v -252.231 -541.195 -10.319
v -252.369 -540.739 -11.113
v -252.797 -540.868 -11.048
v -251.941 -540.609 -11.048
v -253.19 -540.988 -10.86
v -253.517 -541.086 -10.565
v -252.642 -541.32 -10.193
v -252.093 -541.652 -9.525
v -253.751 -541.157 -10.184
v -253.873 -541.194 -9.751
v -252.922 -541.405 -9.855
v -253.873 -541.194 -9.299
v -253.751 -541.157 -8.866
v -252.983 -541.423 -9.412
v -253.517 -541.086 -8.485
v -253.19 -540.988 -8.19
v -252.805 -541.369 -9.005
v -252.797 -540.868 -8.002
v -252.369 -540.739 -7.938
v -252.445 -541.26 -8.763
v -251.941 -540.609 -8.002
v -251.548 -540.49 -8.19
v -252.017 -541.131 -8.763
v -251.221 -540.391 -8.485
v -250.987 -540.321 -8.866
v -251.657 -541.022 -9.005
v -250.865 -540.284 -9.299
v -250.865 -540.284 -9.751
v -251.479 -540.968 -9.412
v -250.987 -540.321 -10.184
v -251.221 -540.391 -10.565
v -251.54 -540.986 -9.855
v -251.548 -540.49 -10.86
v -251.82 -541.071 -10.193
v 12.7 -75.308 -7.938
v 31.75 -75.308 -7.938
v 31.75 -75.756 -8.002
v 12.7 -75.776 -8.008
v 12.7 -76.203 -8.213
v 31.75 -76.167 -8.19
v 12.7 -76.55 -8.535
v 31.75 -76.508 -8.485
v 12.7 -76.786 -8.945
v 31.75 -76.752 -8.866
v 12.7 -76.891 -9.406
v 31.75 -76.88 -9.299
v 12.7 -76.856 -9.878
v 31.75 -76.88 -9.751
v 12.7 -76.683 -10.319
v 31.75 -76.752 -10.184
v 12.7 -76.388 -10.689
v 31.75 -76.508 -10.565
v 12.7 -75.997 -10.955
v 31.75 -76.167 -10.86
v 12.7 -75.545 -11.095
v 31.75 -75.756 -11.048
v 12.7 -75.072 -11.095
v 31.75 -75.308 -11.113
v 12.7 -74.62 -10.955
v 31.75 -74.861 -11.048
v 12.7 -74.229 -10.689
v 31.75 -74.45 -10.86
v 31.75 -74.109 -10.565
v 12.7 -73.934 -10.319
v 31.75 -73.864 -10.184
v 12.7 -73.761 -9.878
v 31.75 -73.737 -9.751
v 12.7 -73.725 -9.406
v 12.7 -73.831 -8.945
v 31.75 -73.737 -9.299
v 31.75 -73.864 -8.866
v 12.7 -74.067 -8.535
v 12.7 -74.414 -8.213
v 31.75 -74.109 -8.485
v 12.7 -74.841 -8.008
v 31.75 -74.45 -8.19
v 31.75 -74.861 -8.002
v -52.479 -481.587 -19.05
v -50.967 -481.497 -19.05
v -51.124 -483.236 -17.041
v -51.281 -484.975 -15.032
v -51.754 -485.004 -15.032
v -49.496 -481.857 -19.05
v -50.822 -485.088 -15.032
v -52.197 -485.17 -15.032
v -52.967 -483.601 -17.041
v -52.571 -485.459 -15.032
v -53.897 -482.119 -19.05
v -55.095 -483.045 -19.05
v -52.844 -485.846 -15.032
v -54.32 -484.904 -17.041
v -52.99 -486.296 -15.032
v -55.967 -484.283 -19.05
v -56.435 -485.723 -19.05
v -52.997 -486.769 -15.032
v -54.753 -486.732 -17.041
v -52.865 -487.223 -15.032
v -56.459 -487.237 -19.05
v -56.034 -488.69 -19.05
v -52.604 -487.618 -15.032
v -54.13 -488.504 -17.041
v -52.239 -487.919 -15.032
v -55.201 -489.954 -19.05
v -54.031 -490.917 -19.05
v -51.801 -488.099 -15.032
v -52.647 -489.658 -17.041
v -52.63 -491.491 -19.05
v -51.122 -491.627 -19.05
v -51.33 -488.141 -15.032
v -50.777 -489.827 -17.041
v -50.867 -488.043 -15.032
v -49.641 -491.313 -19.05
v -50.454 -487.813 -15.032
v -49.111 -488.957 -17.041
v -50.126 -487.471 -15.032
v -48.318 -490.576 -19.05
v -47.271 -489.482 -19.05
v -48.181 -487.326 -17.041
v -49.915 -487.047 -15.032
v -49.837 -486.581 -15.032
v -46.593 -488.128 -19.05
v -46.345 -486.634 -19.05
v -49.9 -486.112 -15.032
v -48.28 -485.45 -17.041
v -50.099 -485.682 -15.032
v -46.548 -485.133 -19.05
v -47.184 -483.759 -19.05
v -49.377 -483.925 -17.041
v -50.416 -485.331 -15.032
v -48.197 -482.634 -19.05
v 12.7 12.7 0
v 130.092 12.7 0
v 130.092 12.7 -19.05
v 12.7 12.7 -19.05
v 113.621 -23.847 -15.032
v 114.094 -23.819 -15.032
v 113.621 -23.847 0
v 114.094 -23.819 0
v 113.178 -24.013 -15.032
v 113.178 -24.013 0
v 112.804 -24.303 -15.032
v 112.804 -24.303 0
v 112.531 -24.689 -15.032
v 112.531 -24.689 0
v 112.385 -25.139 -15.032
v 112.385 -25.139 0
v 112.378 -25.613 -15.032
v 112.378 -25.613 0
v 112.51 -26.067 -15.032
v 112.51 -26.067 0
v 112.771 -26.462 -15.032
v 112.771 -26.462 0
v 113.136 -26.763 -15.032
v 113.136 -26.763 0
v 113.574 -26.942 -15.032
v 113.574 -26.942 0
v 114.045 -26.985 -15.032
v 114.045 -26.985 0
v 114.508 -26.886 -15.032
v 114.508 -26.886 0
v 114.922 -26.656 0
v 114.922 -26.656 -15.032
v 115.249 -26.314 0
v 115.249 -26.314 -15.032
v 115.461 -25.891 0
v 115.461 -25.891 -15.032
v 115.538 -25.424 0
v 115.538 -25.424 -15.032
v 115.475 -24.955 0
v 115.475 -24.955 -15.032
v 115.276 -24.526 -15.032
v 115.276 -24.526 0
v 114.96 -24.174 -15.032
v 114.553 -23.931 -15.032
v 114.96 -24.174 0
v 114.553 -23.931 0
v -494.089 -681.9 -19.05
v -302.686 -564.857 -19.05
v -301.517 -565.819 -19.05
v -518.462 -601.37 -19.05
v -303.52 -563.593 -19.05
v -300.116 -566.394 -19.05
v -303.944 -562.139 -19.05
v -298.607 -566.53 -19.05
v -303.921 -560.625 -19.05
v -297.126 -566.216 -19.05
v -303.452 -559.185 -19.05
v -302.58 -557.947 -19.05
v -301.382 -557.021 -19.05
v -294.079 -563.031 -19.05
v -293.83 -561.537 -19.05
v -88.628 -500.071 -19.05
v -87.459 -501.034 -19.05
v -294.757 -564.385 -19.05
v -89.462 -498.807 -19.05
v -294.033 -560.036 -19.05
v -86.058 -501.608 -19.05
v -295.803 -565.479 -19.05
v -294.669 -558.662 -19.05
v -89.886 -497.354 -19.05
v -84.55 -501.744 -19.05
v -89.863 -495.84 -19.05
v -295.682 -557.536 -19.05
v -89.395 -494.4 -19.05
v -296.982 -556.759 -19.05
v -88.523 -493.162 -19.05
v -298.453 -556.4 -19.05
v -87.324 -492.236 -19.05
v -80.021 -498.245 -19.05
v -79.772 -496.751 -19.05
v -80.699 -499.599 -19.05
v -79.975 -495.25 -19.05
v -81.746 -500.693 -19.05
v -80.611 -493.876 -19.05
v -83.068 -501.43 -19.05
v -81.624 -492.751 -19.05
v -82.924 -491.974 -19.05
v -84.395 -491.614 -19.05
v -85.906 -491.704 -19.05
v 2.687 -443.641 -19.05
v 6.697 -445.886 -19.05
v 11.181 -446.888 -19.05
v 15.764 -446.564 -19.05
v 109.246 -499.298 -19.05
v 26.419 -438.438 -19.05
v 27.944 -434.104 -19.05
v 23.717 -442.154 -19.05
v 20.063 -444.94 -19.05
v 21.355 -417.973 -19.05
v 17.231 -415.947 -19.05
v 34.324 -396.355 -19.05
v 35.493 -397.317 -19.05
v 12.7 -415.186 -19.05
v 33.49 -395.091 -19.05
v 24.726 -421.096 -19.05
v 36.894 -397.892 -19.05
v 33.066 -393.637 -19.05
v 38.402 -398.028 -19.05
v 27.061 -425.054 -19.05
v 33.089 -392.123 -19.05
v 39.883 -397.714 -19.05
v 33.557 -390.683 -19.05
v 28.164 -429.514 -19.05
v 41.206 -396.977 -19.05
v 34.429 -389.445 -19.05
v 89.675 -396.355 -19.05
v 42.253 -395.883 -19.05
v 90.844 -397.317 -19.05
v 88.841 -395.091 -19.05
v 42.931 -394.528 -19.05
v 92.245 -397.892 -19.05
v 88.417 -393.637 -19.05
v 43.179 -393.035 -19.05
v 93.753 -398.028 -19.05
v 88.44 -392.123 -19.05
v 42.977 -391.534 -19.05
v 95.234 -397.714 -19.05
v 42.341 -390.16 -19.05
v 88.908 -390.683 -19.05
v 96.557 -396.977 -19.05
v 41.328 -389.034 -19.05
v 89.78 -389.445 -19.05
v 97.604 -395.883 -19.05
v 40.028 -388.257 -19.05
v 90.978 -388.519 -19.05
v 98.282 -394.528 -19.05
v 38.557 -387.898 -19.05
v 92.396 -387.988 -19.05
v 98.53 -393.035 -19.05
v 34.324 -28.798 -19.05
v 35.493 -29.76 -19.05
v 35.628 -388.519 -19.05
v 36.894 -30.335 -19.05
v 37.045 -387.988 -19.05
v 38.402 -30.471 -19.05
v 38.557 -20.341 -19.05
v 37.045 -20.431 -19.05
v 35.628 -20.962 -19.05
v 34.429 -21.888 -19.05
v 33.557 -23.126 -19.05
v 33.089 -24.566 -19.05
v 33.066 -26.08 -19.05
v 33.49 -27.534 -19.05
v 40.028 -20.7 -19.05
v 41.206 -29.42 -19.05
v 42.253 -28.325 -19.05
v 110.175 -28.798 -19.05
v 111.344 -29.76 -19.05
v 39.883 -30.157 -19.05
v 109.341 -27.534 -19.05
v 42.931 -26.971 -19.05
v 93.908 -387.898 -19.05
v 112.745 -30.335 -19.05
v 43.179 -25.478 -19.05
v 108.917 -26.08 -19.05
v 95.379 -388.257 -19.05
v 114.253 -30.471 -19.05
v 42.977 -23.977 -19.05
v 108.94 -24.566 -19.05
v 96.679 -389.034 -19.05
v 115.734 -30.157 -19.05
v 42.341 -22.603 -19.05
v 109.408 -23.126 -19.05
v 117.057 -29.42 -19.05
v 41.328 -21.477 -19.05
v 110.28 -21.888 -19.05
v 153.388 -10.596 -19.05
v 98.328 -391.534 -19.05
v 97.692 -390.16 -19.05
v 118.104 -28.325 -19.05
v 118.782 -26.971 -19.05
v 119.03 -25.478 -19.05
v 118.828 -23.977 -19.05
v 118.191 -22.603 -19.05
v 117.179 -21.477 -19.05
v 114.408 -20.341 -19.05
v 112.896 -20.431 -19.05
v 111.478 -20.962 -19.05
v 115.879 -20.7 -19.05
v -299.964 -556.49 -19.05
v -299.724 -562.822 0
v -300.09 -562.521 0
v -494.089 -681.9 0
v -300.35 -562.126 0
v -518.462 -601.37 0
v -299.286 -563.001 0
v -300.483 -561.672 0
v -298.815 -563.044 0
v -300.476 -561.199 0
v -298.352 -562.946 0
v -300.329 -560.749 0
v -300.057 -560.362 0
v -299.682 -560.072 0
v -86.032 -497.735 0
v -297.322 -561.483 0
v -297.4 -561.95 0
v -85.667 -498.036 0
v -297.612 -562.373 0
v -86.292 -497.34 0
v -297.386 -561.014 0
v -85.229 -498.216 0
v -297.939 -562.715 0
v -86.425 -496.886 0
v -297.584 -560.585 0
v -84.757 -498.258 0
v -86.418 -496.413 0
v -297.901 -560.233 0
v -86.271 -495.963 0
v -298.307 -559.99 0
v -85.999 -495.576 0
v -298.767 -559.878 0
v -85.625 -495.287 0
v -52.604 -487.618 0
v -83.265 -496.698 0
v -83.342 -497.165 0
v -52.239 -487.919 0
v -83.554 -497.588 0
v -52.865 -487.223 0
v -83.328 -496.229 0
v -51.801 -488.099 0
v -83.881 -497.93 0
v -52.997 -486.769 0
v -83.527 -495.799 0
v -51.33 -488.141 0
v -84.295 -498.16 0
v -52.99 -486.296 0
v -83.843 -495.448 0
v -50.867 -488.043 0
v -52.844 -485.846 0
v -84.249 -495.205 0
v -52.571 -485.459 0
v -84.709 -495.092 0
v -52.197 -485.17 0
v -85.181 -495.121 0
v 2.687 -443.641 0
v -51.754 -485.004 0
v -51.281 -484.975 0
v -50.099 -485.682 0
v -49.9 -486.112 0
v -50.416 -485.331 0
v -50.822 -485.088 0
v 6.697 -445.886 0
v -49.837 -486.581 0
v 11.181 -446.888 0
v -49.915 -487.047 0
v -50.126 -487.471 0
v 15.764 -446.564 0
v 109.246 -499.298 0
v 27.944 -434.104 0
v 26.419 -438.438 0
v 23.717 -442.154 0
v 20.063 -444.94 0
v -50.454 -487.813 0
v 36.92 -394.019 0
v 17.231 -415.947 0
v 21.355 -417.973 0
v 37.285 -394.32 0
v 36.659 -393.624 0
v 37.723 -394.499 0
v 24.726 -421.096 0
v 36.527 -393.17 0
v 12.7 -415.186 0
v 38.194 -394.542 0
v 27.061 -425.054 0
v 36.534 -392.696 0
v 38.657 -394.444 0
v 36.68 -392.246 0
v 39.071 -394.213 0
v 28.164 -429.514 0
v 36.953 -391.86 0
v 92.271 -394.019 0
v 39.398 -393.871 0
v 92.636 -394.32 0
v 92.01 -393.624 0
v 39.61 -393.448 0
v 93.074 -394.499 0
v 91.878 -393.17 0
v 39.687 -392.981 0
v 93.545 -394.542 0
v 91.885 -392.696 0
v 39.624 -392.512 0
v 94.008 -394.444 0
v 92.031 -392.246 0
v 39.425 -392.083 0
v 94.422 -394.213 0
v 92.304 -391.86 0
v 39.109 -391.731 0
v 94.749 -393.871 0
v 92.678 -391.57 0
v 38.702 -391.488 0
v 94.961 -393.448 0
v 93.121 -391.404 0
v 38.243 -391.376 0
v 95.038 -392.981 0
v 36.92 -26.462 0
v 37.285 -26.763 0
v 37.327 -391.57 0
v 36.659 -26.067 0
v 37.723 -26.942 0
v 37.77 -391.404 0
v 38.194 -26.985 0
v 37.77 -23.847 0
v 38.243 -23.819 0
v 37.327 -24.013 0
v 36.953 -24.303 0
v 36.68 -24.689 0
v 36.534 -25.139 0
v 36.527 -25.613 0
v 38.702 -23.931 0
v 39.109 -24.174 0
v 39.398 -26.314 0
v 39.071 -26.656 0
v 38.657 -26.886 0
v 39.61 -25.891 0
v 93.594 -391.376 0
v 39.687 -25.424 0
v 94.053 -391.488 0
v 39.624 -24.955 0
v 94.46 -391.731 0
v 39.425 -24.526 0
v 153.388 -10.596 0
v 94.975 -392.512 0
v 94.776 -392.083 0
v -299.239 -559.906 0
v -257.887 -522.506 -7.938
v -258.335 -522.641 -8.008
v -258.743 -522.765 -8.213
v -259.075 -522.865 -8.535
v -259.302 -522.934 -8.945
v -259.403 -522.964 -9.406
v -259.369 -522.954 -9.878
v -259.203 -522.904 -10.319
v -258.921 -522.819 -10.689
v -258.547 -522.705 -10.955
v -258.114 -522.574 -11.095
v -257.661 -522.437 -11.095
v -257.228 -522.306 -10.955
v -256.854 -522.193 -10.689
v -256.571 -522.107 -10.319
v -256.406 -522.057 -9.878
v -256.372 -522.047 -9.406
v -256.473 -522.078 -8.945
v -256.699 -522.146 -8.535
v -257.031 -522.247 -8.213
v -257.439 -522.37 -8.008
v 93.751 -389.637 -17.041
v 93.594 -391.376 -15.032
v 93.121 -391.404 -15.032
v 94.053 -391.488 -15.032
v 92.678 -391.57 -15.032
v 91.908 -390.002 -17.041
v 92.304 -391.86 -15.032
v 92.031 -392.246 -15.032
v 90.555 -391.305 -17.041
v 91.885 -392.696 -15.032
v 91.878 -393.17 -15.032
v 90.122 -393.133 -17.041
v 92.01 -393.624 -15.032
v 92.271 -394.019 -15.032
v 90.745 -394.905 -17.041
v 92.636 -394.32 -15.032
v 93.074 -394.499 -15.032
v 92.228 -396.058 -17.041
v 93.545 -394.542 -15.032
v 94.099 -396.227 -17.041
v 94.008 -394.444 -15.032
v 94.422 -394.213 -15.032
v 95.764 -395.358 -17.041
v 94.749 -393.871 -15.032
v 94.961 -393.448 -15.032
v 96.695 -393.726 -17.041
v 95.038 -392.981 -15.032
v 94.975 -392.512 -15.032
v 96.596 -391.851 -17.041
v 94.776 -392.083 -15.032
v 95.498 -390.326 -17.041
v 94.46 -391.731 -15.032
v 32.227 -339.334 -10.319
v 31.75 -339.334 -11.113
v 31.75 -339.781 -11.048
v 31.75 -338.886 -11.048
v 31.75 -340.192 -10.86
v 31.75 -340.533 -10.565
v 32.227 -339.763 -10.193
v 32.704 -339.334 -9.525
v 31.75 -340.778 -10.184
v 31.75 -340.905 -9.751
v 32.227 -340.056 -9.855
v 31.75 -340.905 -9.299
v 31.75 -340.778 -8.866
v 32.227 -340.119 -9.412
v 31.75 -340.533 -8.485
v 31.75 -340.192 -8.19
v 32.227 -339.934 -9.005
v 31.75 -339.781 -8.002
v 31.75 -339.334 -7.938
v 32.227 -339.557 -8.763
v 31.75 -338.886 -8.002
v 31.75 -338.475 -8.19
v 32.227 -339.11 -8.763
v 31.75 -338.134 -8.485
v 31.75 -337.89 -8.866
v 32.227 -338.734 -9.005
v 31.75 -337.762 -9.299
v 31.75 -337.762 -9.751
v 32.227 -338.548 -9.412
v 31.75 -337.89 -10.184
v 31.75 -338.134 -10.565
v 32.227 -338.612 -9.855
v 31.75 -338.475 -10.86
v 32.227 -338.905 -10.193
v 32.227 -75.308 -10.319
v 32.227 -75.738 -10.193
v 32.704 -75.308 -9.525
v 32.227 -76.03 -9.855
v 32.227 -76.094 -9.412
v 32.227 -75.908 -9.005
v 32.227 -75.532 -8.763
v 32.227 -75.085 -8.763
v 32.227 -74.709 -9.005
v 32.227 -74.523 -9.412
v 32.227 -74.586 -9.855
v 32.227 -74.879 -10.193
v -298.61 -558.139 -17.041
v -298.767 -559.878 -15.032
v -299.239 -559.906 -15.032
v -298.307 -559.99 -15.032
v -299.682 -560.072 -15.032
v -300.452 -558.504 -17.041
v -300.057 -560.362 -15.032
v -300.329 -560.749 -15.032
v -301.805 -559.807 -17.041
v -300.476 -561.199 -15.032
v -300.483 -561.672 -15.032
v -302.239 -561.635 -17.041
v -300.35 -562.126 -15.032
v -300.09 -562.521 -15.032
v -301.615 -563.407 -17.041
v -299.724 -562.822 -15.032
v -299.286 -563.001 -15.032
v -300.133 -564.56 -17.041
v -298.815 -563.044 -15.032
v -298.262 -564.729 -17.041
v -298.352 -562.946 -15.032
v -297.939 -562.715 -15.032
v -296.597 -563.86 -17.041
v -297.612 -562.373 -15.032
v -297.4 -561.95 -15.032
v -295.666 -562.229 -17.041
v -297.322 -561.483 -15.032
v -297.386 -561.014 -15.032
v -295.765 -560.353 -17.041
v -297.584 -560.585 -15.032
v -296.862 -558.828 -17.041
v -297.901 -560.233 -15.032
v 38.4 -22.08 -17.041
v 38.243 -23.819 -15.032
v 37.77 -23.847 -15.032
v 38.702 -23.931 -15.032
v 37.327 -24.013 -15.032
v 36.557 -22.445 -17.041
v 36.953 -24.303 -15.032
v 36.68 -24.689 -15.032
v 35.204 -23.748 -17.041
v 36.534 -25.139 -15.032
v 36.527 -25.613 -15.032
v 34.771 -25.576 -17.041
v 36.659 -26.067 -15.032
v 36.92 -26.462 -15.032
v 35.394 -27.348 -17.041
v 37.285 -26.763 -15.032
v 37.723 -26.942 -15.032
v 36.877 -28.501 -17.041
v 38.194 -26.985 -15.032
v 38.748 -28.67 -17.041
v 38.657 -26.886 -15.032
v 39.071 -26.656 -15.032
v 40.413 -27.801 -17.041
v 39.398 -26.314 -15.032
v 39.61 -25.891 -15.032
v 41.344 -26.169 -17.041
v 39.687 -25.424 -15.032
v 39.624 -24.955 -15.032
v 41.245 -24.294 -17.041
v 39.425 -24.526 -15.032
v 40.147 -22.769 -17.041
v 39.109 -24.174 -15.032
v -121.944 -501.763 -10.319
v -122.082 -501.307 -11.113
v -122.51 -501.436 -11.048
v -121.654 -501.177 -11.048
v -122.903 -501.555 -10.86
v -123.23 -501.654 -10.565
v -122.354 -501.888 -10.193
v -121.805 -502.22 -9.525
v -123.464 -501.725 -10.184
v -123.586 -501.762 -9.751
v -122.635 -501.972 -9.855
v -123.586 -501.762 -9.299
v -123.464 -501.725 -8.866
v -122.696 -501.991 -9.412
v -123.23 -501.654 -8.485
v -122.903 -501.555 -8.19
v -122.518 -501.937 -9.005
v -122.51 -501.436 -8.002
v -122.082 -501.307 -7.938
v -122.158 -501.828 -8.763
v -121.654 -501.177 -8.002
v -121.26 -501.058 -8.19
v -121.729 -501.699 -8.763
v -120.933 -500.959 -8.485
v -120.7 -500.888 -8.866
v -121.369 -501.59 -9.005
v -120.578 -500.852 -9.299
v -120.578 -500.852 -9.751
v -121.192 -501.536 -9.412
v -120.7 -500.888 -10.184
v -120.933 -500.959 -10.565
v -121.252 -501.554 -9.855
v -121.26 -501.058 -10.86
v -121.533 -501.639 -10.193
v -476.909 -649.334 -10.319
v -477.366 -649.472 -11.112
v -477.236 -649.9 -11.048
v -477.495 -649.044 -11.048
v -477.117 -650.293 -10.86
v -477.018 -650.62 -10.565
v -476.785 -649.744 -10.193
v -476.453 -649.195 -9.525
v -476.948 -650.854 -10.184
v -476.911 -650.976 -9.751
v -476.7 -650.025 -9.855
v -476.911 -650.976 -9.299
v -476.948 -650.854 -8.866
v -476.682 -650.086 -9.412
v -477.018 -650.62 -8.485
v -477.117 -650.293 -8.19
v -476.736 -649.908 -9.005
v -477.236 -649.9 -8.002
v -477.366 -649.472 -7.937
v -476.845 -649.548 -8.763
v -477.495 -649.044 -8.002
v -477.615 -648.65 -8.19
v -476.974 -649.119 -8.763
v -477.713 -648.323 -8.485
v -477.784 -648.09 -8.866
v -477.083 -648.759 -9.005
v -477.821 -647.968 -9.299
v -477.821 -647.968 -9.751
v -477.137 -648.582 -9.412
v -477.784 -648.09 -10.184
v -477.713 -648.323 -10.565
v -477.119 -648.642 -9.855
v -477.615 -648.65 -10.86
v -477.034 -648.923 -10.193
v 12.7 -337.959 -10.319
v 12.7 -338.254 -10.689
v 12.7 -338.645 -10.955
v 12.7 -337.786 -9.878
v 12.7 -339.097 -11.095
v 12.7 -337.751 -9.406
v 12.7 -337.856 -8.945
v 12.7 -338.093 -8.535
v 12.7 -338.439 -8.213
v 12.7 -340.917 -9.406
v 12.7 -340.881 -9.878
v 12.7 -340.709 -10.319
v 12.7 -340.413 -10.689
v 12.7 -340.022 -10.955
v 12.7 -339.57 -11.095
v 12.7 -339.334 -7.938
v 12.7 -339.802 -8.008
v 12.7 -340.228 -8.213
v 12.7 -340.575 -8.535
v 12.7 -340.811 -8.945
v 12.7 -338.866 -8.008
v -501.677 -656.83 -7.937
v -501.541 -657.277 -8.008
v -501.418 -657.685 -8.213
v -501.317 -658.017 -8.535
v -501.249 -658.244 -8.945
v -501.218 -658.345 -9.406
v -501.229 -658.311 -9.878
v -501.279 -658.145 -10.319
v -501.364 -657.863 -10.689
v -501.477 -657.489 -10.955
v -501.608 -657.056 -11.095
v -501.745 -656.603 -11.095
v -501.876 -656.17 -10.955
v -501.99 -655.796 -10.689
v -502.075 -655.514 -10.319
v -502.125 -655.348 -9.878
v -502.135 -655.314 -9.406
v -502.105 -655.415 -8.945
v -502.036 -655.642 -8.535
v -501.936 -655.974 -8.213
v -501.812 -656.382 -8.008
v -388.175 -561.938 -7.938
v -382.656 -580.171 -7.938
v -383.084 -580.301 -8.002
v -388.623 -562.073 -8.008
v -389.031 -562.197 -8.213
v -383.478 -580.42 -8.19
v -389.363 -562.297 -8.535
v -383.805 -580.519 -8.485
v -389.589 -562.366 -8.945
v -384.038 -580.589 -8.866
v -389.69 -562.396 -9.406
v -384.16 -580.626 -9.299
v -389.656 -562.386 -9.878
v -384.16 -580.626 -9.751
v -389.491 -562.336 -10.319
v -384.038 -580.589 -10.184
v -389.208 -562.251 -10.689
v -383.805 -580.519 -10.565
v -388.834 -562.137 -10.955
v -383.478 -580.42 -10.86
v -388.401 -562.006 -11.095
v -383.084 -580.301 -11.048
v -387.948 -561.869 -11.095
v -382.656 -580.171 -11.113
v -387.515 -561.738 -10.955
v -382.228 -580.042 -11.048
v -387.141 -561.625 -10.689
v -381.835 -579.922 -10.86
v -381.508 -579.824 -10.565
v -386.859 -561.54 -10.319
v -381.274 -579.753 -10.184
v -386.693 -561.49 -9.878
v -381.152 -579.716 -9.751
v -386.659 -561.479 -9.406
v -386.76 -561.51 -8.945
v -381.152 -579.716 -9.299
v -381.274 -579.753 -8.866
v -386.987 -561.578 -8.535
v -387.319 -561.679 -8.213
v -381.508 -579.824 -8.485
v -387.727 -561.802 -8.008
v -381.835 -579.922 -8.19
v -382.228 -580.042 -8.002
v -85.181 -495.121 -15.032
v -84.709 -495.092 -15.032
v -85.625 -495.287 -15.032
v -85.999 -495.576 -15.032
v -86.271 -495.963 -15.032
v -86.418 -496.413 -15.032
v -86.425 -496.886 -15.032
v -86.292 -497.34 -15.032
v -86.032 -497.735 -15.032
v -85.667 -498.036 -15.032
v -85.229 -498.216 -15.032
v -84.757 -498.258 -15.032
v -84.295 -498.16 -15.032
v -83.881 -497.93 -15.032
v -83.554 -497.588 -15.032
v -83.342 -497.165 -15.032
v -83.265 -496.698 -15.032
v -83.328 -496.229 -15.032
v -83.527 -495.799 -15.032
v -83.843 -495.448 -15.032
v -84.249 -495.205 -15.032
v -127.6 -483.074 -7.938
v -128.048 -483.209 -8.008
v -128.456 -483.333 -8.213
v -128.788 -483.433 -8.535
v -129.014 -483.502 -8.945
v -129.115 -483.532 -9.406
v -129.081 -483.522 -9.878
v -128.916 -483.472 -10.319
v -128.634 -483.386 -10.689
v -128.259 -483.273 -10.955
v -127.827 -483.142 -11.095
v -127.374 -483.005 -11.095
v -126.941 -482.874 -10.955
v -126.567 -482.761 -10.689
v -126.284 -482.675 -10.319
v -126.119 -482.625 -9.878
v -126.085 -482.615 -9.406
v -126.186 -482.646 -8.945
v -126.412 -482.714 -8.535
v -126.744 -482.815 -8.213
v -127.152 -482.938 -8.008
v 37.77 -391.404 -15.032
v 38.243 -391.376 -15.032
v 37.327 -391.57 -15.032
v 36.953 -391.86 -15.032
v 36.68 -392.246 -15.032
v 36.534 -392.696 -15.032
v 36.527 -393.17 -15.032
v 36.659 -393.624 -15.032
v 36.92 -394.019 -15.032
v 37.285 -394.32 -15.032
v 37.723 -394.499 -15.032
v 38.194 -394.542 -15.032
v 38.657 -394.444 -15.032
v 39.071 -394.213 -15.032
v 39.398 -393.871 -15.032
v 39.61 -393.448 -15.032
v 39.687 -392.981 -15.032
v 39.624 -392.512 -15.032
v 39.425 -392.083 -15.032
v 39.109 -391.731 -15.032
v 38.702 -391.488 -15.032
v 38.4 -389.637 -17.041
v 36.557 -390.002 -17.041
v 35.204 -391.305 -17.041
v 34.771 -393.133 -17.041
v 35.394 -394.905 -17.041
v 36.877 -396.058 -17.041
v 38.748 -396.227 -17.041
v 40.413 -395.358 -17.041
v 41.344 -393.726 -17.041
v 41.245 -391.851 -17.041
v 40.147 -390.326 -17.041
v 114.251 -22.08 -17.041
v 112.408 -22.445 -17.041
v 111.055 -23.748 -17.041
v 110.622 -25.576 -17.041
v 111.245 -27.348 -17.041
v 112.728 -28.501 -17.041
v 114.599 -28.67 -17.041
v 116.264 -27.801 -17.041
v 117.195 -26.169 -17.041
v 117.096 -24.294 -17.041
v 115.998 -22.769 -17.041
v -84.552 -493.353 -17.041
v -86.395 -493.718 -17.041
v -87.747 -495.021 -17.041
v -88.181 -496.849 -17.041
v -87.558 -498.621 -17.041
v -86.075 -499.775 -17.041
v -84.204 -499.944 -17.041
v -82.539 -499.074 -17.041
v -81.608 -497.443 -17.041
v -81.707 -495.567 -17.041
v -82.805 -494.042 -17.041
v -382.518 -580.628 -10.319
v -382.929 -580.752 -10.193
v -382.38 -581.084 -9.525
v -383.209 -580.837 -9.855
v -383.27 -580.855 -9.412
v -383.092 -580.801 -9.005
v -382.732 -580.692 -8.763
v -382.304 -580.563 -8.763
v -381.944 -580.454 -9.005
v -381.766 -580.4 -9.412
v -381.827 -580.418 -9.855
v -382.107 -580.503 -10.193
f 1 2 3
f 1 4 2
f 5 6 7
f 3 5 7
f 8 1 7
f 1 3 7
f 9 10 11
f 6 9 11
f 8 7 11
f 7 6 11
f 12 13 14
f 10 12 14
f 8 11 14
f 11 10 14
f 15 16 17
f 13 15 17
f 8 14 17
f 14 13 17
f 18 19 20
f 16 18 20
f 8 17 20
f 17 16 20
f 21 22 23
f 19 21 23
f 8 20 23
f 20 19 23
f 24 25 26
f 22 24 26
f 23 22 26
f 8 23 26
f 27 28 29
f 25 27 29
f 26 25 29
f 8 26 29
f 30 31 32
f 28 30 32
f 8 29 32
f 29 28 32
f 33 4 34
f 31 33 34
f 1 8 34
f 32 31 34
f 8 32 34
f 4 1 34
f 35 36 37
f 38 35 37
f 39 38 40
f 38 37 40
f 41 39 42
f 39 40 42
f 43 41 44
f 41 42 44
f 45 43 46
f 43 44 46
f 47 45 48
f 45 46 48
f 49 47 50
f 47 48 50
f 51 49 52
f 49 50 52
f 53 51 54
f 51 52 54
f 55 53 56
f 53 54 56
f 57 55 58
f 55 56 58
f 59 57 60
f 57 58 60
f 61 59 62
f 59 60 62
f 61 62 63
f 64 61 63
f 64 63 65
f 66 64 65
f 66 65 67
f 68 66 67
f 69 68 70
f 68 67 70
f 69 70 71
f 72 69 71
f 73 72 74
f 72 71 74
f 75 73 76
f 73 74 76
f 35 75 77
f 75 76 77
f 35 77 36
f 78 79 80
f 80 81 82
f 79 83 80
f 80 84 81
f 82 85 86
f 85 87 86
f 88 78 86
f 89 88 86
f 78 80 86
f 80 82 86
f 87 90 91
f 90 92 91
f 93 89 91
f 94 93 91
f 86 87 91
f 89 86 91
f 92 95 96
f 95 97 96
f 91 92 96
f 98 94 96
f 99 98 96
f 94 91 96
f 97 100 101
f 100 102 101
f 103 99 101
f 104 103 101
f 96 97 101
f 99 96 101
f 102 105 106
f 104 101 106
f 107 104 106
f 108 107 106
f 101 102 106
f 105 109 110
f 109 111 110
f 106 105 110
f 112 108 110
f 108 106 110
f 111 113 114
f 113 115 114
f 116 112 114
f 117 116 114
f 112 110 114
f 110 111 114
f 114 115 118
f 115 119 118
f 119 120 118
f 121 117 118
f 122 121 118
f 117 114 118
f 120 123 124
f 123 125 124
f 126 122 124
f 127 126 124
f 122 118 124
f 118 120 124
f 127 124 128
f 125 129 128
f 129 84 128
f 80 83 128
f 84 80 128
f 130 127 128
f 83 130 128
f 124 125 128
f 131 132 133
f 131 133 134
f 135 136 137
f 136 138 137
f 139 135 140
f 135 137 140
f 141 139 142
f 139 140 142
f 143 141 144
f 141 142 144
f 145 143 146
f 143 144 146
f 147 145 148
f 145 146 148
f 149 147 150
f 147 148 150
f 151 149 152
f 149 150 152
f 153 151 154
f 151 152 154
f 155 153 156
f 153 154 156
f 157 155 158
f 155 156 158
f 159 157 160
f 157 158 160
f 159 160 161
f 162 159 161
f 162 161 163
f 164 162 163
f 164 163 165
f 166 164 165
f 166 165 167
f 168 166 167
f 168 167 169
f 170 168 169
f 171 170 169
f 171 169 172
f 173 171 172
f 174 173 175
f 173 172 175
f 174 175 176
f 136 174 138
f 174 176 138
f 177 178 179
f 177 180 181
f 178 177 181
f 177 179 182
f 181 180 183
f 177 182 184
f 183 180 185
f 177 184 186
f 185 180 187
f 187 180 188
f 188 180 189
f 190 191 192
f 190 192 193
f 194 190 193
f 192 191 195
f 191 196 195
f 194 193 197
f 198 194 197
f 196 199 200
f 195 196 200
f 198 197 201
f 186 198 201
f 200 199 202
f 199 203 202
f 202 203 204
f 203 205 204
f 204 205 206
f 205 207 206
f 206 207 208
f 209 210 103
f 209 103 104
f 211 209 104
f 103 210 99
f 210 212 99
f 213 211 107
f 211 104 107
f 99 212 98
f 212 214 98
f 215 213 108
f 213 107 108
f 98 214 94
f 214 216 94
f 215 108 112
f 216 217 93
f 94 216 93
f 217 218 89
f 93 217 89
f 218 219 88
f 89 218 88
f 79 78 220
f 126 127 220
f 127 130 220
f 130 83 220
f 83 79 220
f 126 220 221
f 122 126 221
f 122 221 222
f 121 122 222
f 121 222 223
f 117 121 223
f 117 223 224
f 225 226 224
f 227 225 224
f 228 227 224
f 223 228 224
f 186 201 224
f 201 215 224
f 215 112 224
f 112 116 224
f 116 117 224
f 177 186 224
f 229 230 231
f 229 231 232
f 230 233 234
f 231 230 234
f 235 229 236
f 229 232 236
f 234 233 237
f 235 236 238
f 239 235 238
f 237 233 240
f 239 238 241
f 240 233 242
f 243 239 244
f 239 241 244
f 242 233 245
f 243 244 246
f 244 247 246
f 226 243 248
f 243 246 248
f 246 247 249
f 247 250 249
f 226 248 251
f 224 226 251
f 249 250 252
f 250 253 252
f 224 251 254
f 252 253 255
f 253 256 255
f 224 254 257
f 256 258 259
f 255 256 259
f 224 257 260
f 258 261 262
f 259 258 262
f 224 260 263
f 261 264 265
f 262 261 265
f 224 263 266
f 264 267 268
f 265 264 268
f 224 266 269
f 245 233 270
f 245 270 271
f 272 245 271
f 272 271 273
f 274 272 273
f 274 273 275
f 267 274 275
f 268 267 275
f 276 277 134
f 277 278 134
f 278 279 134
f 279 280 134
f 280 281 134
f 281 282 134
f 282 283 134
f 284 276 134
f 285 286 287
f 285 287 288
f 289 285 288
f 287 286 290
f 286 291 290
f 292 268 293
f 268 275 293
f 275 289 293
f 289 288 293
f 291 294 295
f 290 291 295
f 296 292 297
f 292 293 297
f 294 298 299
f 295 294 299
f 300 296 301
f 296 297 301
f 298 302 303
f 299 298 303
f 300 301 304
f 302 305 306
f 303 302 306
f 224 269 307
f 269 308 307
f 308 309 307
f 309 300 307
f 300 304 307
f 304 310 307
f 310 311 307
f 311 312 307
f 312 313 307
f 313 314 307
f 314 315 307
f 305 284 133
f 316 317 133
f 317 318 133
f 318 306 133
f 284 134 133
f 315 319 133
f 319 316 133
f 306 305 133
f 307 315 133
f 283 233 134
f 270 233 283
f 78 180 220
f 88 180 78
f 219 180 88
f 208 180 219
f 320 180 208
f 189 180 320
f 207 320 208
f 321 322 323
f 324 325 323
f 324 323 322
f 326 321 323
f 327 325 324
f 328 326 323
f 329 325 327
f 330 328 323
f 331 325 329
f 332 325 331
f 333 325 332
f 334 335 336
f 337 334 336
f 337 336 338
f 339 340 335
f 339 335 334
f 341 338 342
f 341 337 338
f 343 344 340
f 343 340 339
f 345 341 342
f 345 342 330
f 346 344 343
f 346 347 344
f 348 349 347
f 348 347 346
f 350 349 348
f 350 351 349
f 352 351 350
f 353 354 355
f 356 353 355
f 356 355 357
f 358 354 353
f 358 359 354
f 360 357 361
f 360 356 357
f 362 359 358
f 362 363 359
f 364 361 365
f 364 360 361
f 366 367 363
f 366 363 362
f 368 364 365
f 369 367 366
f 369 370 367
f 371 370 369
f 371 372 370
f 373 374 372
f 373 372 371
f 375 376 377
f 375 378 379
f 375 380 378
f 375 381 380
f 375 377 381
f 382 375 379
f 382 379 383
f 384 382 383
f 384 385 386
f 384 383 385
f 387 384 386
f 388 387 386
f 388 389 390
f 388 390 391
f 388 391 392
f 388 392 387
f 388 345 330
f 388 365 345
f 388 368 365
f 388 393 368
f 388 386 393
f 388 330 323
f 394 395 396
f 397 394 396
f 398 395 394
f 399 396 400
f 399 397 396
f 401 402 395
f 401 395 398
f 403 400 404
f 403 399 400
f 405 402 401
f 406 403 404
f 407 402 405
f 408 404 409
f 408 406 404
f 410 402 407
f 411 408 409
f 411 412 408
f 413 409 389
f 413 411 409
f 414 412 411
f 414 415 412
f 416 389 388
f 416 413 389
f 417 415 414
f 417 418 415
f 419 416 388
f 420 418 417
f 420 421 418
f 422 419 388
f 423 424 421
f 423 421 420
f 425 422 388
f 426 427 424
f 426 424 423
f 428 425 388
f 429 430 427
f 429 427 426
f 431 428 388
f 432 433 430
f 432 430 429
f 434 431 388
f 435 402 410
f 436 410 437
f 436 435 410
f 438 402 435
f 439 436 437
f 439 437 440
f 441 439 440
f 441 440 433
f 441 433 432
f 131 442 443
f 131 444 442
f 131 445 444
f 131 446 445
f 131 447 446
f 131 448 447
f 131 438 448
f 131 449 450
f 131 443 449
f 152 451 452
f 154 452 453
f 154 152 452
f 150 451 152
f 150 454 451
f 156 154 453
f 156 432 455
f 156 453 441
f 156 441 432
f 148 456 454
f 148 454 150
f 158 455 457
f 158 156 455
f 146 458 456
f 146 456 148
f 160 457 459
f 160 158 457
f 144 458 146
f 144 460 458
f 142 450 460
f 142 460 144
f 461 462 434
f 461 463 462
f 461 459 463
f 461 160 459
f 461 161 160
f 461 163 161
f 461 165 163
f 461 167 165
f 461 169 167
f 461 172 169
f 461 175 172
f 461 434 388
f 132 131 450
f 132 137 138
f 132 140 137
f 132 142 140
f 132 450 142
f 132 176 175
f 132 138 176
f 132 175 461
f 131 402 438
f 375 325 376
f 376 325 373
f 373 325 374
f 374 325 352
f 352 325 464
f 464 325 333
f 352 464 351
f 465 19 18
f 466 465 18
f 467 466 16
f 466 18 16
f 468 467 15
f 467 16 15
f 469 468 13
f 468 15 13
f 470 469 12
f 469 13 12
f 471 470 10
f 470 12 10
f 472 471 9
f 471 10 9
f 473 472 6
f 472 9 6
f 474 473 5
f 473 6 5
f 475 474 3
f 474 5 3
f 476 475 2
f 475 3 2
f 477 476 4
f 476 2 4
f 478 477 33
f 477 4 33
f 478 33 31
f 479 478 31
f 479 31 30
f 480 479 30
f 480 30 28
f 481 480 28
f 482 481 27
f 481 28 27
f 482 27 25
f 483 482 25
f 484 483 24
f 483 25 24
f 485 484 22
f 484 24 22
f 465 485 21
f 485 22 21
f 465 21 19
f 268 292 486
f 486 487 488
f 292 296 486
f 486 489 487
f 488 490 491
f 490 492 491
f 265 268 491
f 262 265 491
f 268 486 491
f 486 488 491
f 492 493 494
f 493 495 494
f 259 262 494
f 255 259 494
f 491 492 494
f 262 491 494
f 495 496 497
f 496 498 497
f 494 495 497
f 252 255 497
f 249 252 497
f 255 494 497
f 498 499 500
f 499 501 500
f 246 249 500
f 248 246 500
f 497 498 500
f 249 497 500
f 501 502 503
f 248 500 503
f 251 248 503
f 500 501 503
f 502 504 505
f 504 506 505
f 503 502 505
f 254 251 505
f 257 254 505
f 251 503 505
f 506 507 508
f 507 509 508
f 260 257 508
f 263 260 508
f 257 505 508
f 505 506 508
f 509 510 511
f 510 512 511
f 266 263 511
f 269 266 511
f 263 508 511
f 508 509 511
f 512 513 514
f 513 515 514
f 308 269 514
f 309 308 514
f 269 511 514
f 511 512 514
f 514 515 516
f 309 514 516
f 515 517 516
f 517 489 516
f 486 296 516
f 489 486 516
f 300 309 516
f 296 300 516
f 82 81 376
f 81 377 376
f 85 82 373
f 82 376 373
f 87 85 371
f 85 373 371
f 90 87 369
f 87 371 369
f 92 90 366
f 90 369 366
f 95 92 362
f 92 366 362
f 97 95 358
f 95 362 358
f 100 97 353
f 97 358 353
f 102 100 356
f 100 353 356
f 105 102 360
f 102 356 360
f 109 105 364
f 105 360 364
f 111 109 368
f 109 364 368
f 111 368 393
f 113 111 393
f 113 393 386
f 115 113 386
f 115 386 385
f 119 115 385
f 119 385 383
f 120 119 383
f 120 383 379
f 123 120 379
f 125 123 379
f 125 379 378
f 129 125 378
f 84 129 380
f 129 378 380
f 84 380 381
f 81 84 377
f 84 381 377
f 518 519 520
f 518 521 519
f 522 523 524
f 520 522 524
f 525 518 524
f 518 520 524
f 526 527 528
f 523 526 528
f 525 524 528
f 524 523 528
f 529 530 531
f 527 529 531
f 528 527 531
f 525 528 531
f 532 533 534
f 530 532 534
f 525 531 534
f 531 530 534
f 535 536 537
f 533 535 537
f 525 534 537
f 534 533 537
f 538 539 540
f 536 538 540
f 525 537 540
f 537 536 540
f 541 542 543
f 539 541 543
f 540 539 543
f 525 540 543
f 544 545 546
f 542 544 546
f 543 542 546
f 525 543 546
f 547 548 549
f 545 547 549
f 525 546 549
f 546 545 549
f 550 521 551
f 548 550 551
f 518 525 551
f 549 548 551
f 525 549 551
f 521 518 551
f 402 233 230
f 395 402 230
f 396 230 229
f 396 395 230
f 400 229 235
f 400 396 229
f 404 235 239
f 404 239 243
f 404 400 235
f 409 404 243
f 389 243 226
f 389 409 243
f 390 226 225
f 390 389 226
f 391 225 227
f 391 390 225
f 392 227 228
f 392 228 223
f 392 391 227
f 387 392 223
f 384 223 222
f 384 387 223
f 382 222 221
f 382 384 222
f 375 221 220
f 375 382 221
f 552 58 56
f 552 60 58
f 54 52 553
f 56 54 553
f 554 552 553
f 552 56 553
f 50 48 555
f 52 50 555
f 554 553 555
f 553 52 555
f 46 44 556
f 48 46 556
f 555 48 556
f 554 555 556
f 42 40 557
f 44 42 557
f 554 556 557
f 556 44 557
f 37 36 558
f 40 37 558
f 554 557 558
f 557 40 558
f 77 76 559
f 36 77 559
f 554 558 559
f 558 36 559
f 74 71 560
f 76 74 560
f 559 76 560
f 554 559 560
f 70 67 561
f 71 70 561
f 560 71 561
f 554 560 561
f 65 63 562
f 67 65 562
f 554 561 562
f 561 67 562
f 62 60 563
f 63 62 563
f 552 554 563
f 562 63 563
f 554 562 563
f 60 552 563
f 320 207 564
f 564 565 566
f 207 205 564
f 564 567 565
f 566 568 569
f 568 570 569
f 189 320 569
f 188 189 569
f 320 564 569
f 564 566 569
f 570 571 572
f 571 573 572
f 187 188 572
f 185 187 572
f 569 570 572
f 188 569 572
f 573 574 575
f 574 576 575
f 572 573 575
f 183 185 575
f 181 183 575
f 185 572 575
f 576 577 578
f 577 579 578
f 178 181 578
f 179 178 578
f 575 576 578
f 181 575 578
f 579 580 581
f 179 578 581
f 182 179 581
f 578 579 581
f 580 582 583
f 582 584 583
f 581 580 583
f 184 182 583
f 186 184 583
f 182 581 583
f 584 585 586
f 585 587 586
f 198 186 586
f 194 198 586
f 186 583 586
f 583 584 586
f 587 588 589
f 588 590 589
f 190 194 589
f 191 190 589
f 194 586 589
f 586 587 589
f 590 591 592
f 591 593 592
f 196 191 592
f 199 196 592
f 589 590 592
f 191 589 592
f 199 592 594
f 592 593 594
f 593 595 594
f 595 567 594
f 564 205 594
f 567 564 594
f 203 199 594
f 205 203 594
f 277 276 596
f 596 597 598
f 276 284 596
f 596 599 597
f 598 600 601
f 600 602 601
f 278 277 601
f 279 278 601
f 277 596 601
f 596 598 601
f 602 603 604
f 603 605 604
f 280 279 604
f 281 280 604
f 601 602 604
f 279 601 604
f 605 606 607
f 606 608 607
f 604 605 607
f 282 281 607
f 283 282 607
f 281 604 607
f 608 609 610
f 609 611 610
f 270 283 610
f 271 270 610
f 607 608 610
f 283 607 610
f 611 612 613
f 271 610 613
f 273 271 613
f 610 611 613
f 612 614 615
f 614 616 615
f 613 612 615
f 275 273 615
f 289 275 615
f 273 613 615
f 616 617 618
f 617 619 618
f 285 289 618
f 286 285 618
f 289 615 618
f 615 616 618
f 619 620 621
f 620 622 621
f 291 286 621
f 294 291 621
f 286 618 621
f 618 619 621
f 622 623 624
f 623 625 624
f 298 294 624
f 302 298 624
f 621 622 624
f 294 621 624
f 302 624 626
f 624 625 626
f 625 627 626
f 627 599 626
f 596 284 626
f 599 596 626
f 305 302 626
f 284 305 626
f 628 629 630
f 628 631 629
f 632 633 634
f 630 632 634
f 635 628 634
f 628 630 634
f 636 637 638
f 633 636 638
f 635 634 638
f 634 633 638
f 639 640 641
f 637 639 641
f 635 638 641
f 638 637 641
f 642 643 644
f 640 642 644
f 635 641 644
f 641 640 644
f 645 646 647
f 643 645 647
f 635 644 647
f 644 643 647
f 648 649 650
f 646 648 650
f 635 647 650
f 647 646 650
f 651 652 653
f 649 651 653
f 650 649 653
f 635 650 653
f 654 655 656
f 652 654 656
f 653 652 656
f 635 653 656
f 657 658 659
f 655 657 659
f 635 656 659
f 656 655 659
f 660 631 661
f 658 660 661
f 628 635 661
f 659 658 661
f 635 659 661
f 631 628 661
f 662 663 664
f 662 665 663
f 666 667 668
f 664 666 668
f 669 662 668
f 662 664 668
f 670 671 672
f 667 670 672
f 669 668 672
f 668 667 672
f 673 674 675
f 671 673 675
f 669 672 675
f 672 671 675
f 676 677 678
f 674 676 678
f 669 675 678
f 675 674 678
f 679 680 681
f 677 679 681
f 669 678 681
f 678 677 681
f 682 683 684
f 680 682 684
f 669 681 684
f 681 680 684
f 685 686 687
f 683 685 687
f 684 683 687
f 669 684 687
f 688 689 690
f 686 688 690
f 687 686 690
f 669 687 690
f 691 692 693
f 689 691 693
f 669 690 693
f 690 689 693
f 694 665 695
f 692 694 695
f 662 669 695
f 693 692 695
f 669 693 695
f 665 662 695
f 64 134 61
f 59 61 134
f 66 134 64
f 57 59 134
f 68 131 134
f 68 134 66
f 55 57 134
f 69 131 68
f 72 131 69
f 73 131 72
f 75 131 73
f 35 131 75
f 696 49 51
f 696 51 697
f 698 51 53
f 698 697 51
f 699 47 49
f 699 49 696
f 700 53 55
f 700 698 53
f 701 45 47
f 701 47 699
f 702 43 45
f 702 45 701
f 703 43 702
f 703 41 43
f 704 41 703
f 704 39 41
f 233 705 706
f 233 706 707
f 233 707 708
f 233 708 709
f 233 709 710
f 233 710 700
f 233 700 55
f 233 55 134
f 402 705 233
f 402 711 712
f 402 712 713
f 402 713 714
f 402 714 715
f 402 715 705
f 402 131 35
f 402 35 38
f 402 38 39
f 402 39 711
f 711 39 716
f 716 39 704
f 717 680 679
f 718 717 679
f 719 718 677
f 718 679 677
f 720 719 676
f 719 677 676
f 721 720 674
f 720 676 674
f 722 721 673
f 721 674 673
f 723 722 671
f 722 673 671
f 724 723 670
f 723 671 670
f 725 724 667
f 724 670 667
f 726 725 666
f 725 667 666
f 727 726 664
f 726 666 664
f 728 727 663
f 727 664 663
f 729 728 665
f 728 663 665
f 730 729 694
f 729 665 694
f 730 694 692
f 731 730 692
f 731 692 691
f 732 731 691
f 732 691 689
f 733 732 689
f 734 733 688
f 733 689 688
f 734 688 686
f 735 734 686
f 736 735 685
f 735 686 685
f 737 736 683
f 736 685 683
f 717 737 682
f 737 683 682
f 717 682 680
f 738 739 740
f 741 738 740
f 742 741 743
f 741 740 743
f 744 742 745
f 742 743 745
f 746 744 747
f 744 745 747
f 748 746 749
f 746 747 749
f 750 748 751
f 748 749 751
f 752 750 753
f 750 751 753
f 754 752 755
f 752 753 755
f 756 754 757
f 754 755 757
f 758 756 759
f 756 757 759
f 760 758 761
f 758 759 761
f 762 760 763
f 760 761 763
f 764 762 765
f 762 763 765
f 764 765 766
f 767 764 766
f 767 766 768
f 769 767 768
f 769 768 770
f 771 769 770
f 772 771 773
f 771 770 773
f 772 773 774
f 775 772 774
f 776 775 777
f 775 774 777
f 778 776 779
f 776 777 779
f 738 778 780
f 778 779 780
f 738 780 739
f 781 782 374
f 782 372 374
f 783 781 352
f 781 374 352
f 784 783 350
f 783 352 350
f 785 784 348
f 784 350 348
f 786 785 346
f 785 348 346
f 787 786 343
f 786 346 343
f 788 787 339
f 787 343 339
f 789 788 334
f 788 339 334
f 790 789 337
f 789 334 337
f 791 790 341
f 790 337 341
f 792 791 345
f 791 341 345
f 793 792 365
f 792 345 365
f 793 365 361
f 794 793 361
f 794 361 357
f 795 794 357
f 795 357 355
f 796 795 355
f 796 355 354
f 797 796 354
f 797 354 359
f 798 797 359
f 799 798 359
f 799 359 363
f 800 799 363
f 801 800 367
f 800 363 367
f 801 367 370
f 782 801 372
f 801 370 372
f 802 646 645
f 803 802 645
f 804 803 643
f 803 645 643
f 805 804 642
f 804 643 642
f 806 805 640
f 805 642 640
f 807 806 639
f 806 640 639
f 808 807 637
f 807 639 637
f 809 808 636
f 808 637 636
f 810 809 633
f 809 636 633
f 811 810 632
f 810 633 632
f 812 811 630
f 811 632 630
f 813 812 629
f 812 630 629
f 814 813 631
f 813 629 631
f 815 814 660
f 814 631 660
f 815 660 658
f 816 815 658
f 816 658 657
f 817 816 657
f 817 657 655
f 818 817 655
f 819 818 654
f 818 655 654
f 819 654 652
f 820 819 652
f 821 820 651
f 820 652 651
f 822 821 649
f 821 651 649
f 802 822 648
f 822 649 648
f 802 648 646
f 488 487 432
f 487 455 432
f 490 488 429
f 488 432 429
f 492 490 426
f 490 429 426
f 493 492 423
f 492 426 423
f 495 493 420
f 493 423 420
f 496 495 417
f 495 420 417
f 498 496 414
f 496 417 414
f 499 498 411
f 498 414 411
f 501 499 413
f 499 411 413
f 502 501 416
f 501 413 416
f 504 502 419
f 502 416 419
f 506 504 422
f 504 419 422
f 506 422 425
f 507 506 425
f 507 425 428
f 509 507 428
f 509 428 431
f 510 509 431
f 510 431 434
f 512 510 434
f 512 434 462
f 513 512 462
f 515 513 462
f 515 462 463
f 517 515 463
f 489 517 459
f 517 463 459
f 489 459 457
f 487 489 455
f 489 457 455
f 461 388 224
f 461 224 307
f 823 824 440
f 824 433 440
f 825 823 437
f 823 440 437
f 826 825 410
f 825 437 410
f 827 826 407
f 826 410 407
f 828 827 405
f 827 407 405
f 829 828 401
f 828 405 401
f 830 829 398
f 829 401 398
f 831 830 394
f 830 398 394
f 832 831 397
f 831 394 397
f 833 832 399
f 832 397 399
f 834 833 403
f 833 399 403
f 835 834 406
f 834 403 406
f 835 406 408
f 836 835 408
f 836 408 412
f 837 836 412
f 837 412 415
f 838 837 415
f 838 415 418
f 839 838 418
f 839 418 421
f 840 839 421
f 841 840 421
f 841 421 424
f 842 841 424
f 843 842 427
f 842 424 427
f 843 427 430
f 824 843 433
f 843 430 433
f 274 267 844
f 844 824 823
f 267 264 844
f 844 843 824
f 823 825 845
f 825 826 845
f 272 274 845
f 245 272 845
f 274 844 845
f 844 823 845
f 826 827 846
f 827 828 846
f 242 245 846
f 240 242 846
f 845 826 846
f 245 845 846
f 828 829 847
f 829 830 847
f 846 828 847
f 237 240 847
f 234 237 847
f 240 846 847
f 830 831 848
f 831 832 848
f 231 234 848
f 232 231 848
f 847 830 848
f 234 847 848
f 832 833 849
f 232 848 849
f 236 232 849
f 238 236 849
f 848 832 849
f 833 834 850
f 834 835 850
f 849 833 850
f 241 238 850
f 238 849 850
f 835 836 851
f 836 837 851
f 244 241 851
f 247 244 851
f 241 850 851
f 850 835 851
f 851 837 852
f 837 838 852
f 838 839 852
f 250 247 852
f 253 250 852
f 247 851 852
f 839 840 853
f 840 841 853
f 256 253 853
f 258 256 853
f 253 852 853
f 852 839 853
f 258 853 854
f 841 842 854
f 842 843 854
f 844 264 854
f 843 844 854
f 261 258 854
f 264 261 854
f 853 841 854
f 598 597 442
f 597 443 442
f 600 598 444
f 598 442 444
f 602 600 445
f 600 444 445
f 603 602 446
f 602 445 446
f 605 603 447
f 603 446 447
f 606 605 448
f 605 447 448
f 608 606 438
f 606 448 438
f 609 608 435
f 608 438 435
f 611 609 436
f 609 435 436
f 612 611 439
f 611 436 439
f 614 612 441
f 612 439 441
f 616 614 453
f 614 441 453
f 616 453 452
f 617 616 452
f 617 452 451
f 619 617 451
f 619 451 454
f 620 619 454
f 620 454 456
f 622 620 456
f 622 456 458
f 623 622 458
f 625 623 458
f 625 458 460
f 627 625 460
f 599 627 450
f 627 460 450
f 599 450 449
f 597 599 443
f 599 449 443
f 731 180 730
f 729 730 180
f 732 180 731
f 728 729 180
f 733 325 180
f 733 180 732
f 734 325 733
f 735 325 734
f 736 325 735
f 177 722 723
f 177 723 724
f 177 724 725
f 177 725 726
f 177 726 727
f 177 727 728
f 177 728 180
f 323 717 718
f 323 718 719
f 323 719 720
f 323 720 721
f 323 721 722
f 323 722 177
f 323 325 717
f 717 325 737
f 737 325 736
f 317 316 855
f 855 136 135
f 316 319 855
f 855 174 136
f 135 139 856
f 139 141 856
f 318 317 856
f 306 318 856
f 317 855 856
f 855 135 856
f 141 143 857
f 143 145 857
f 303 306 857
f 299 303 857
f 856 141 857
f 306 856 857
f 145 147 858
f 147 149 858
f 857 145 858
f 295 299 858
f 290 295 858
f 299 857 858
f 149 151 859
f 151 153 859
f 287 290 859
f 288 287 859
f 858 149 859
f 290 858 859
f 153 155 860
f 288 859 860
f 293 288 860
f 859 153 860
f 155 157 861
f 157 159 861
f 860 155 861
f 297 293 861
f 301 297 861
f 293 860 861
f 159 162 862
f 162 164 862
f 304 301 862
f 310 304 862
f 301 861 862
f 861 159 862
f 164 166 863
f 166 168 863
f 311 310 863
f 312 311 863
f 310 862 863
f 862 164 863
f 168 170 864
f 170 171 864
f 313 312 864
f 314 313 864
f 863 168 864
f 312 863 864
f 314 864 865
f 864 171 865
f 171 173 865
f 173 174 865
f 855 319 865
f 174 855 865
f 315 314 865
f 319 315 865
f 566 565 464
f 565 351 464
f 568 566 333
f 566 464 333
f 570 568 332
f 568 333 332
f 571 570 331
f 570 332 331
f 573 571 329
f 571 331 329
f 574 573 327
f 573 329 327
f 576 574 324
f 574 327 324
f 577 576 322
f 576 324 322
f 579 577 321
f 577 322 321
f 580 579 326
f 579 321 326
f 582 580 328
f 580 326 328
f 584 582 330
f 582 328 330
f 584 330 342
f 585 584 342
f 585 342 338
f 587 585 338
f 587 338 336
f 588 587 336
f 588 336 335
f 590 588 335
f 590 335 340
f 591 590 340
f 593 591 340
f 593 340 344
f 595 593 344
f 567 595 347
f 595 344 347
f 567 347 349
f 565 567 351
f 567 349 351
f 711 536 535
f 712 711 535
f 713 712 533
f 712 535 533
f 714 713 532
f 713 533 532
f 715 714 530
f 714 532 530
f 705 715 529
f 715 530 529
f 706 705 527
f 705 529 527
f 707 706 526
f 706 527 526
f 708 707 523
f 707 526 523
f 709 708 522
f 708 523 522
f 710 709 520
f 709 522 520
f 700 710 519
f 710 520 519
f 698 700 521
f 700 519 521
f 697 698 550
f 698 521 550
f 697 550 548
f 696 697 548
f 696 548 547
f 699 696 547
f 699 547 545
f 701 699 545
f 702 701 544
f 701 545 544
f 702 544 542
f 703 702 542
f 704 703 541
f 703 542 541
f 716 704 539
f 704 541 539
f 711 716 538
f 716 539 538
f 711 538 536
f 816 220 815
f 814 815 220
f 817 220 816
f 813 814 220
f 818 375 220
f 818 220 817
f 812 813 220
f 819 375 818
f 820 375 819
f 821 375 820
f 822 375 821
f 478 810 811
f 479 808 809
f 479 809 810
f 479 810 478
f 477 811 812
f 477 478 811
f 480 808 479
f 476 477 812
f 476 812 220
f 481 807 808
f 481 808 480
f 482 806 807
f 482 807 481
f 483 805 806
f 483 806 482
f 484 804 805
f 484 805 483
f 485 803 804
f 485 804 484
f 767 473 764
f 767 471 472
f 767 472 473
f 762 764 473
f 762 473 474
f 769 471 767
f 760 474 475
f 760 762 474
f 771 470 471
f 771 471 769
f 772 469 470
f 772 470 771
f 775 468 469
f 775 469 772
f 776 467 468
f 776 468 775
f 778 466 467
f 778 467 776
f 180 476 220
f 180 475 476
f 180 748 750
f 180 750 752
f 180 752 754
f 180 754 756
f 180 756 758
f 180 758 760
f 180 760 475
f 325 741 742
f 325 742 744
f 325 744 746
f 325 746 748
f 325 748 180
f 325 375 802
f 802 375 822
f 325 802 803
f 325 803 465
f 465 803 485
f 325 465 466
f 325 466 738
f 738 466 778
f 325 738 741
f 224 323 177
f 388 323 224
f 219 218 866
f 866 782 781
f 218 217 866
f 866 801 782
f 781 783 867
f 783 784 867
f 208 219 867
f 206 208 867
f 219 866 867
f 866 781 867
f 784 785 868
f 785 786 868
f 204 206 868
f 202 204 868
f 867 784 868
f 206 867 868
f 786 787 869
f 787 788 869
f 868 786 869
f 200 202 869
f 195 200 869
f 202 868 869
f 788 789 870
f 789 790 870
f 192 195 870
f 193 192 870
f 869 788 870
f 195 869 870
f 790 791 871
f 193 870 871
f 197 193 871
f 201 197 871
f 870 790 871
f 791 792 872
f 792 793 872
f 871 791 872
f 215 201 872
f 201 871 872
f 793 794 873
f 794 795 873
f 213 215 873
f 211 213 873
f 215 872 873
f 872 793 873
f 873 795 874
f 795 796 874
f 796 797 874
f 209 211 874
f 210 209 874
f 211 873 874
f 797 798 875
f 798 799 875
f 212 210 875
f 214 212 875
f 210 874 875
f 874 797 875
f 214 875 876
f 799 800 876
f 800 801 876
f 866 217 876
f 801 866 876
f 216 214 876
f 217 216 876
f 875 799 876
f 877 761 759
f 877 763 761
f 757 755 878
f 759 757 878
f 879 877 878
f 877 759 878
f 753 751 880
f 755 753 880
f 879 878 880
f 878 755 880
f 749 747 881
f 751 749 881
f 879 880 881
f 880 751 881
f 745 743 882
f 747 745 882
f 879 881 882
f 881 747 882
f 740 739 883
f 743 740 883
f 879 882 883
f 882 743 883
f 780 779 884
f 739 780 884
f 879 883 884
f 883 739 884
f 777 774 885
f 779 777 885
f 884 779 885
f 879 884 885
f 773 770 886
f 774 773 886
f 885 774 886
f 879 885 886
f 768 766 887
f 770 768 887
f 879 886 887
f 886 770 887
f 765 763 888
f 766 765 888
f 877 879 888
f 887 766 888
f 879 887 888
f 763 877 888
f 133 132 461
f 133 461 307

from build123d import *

# Parameters (mm, degrees)
BOSS_EXTRUDE1_DEPTH = 19.05
CHAMFER1_SIZE       = 25.4
CHAMFER1_SIZE2      = 23.3906272
HOLE2_D             = 3.175
HOLE2_DEPTH         = 31.75
HOLE2_CSINK_D       = 10.16
HOLE2_CSINK_ANGLE   = 82
HOLE2_TIP           = 0.953866233
HOLE4_D             = 3.175
HOLE4_DEPTH         = 31.75
HOLE4_CSINK_D       = 10.16
HOLE4_CSINK_ANGLE   = 82
HOLE4_TIP           = 0.953866233
HOLE5_D             = 3.175
HOLE5_DEPTH         = 38.1
HOLE5_CSINK_D       = 10.16
HOLE5_CSINK_ANGLE   = 82
HOLE5_TIP           = 0.953866233
HOLE6_D             = 3.175
HOLE6_DEPTH         = 38.1
HOLE6_CSINK_D       = 10.16
HOLE6_CSINK_ANGLE   = 82
HOLE6_TIP           = 0.953866233


with BuildPart() as part:
    # Sketch1 → Boss-Extrude1 (new body)
    with BuildSketch(Plane.XY):
        with BuildLine():
            Line((12.7, 12.7), (12.7, -415.185594934))
            ThreePointArc((12.7, -415.185594934), (27.339445595, -436.32629993), (2.687239133, -443.641454859))
            Line((2.687239133, -443.641454859), (-518.461959982, -601.369999539))
            Line((-518.461959982, -601.369999539), (-494.089021628, -681.900364725))
            Line((-494.089021628, -681.900364725), (109.245636646, -499.2979588))
            Line((109.245636646, -499.2979588), (155.492294041, 12.7))
            Line((155.492294041, 12.7), (12.7, 12.7))
        make_face()
    extrude(amount=-BOSS_EXTRUDE1_DEPTH)

    # Chamfer1
    chamfer1_edges = [part.edges().sort_by_distance(p)[0] for p in [
        (155.492294041, 12.7, -9.525),
    ]]
    chamfer1_side = [part.faces().sort_by_distance(p)[0] for p in [
        (84.09614702, 12.7, -9.525),
    ]]
    chamfer(chamfer1_edges, length=CHAMFER1_SIZE, length2=CHAMFER1_SIZE2, reference=chamfer1_side[0])

    # Hole2
    with Locations(Plane(origin=(0, 10.424290059, 165.474999994), x_dir=(0, 0, -1), z_dir=(-1, 0, 0))):
        with Locations((-155.949999994, 107.734820482), (155.949999994, 107.734820482), (155.949999994, 327.755881328), (174.999999994, 85.732714397), (174.999999994, 349.757987412), (-174.999999994, 349.757987412), (-174.999999994, 85.732714397), (-155.949999994, 327.755881328)):
            CounterSinkHole(HOLE2_D / 2, HOLE2_CSINK_D / 2, depth=HOLE2_DEPTH, counter_sink_angle=HOLE2_CSINK_ANGLE)
            with Locations((0, 0, -(HOLE2_DEPTH + HOLE2_TIP / 2))):  # 118° drill point
                Cone(0, HOLE2_D / 2, HOLE2_TIP, mode=Mode.SUBTRACT)

    # Hole4
    with Locations(Plane(origin=(264.696145853, -351.074163461, 165.474999994), x_dir=(0, 0, -1), z_dir=(-0.2896786029738453, 0.9571239768071436, 8.258871730585588e-15))):
        with Locations((174.999999994, 685.961004241), (174.999999994, 549.837259632), (174.999999994, 413.713515022), (81.549999997, 779.649723129), (81.549999997, 652.344645962), (62.499999997, 662.953402392), (62.499999997, 769.040966698), (-62.499999997, 769.040966698), (-62.499999997, 662.953402392), (-81.549999997, 652.344645962), (-81.549999997, 779.649723129), (-174.999999994, 413.713515022), (-174.999999994, 549.837259632), (-174.999999994, 685.961004241), (-82.737499997, 600.384620239), (0, 600.384620239), (82.737499997, 600.384620239), (0, 376.737770337), (-82.737499997, 376.737770337), (82.737499997, 376.737770337)):
            CounterSinkHole(HOLE4_D / 2, HOLE4_CSINK_D / 2, depth=HOLE4_DEPTH, counter_sink_angle=HOLE4_CSINK_ANGLE)
            with Locations((0, 0, -(HOLE4_DEPTH + HOLE4_TIP / 2))):  # 118° drill point
                Cone(0, HOLE4_D / 2, HOLE4_TIP, mode=Mode.SUBTRACT)

    # Hole5
    with Locations(Plane(origin=(155.286738577, 10.424290059, -19.05), x_dir=(-0.08995962873759064, -0.9959454127598535, 0), z_dir=(0, 0, -1))):
        with Locations((46.221112845, 113.488854888), (39.39759596, 37.945520226), (412.28786892, 80.423559293), (407.308516105, 25.297013484), (513.561319184, 161.164706775), (597.46020397, 127.267357003), (610.543339245, 159.649253123), (694.322923815, 367.011001477), (526.644454459, 193.546602895), (610.424039029, 400.908351249)):
            CounterSinkHole(HOLE5_D / 2, HOLE5_CSINK_D / 2, depth=HOLE5_DEPTH, counter_sink_angle=HOLE5_CSINK_ANGLE)
            with Locations((0, 0, -(HOLE5_DEPTH + HOLE5_TIP / 2))):  # 118° drill point
                Cone(0, HOLE5_D / 2, HOLE5_TIP, mode=Mode.SUBTRACT)

    # Hole6
    with Locations(Plane(origin=(-643.705760022, -231.394989772, 165.474999994), x_dir=(0, 0, -1), z_dir=(-0.9571239768071421, -0.2896786029738502, -1.2569443472852944e-15))):
        with Locations((-108.649999997, 332.89193461), (108.649999997, 332.89193461), (207.774999994, 332.89193461), (174.999999994, 448.336332751), (135.266666663, 384.042401694), (176.283333328, 384.042401694), (-174.999999994, 448.336332751), (-135.266666663, 384.042401694), (-176.283333328, 384.042401694), (-207.774999994, 332.89193461)):
            CounterSinkHole(HOLE6_D / 2, HOLE6_CSINK_D / 2, depth=HOLE6_DEPTH, counter_sink_angle=HOLE6_CSINK_ANGLE)
            with Locations((0, 0, -(HOLE6_DEPTH + HOLE6_TIP / 2))):  # 118° drill point
                Cone(0, HOLE6_D / 2, HOLE6_TIP, mode=Mode.SUBTRACT)


solid = part.part
